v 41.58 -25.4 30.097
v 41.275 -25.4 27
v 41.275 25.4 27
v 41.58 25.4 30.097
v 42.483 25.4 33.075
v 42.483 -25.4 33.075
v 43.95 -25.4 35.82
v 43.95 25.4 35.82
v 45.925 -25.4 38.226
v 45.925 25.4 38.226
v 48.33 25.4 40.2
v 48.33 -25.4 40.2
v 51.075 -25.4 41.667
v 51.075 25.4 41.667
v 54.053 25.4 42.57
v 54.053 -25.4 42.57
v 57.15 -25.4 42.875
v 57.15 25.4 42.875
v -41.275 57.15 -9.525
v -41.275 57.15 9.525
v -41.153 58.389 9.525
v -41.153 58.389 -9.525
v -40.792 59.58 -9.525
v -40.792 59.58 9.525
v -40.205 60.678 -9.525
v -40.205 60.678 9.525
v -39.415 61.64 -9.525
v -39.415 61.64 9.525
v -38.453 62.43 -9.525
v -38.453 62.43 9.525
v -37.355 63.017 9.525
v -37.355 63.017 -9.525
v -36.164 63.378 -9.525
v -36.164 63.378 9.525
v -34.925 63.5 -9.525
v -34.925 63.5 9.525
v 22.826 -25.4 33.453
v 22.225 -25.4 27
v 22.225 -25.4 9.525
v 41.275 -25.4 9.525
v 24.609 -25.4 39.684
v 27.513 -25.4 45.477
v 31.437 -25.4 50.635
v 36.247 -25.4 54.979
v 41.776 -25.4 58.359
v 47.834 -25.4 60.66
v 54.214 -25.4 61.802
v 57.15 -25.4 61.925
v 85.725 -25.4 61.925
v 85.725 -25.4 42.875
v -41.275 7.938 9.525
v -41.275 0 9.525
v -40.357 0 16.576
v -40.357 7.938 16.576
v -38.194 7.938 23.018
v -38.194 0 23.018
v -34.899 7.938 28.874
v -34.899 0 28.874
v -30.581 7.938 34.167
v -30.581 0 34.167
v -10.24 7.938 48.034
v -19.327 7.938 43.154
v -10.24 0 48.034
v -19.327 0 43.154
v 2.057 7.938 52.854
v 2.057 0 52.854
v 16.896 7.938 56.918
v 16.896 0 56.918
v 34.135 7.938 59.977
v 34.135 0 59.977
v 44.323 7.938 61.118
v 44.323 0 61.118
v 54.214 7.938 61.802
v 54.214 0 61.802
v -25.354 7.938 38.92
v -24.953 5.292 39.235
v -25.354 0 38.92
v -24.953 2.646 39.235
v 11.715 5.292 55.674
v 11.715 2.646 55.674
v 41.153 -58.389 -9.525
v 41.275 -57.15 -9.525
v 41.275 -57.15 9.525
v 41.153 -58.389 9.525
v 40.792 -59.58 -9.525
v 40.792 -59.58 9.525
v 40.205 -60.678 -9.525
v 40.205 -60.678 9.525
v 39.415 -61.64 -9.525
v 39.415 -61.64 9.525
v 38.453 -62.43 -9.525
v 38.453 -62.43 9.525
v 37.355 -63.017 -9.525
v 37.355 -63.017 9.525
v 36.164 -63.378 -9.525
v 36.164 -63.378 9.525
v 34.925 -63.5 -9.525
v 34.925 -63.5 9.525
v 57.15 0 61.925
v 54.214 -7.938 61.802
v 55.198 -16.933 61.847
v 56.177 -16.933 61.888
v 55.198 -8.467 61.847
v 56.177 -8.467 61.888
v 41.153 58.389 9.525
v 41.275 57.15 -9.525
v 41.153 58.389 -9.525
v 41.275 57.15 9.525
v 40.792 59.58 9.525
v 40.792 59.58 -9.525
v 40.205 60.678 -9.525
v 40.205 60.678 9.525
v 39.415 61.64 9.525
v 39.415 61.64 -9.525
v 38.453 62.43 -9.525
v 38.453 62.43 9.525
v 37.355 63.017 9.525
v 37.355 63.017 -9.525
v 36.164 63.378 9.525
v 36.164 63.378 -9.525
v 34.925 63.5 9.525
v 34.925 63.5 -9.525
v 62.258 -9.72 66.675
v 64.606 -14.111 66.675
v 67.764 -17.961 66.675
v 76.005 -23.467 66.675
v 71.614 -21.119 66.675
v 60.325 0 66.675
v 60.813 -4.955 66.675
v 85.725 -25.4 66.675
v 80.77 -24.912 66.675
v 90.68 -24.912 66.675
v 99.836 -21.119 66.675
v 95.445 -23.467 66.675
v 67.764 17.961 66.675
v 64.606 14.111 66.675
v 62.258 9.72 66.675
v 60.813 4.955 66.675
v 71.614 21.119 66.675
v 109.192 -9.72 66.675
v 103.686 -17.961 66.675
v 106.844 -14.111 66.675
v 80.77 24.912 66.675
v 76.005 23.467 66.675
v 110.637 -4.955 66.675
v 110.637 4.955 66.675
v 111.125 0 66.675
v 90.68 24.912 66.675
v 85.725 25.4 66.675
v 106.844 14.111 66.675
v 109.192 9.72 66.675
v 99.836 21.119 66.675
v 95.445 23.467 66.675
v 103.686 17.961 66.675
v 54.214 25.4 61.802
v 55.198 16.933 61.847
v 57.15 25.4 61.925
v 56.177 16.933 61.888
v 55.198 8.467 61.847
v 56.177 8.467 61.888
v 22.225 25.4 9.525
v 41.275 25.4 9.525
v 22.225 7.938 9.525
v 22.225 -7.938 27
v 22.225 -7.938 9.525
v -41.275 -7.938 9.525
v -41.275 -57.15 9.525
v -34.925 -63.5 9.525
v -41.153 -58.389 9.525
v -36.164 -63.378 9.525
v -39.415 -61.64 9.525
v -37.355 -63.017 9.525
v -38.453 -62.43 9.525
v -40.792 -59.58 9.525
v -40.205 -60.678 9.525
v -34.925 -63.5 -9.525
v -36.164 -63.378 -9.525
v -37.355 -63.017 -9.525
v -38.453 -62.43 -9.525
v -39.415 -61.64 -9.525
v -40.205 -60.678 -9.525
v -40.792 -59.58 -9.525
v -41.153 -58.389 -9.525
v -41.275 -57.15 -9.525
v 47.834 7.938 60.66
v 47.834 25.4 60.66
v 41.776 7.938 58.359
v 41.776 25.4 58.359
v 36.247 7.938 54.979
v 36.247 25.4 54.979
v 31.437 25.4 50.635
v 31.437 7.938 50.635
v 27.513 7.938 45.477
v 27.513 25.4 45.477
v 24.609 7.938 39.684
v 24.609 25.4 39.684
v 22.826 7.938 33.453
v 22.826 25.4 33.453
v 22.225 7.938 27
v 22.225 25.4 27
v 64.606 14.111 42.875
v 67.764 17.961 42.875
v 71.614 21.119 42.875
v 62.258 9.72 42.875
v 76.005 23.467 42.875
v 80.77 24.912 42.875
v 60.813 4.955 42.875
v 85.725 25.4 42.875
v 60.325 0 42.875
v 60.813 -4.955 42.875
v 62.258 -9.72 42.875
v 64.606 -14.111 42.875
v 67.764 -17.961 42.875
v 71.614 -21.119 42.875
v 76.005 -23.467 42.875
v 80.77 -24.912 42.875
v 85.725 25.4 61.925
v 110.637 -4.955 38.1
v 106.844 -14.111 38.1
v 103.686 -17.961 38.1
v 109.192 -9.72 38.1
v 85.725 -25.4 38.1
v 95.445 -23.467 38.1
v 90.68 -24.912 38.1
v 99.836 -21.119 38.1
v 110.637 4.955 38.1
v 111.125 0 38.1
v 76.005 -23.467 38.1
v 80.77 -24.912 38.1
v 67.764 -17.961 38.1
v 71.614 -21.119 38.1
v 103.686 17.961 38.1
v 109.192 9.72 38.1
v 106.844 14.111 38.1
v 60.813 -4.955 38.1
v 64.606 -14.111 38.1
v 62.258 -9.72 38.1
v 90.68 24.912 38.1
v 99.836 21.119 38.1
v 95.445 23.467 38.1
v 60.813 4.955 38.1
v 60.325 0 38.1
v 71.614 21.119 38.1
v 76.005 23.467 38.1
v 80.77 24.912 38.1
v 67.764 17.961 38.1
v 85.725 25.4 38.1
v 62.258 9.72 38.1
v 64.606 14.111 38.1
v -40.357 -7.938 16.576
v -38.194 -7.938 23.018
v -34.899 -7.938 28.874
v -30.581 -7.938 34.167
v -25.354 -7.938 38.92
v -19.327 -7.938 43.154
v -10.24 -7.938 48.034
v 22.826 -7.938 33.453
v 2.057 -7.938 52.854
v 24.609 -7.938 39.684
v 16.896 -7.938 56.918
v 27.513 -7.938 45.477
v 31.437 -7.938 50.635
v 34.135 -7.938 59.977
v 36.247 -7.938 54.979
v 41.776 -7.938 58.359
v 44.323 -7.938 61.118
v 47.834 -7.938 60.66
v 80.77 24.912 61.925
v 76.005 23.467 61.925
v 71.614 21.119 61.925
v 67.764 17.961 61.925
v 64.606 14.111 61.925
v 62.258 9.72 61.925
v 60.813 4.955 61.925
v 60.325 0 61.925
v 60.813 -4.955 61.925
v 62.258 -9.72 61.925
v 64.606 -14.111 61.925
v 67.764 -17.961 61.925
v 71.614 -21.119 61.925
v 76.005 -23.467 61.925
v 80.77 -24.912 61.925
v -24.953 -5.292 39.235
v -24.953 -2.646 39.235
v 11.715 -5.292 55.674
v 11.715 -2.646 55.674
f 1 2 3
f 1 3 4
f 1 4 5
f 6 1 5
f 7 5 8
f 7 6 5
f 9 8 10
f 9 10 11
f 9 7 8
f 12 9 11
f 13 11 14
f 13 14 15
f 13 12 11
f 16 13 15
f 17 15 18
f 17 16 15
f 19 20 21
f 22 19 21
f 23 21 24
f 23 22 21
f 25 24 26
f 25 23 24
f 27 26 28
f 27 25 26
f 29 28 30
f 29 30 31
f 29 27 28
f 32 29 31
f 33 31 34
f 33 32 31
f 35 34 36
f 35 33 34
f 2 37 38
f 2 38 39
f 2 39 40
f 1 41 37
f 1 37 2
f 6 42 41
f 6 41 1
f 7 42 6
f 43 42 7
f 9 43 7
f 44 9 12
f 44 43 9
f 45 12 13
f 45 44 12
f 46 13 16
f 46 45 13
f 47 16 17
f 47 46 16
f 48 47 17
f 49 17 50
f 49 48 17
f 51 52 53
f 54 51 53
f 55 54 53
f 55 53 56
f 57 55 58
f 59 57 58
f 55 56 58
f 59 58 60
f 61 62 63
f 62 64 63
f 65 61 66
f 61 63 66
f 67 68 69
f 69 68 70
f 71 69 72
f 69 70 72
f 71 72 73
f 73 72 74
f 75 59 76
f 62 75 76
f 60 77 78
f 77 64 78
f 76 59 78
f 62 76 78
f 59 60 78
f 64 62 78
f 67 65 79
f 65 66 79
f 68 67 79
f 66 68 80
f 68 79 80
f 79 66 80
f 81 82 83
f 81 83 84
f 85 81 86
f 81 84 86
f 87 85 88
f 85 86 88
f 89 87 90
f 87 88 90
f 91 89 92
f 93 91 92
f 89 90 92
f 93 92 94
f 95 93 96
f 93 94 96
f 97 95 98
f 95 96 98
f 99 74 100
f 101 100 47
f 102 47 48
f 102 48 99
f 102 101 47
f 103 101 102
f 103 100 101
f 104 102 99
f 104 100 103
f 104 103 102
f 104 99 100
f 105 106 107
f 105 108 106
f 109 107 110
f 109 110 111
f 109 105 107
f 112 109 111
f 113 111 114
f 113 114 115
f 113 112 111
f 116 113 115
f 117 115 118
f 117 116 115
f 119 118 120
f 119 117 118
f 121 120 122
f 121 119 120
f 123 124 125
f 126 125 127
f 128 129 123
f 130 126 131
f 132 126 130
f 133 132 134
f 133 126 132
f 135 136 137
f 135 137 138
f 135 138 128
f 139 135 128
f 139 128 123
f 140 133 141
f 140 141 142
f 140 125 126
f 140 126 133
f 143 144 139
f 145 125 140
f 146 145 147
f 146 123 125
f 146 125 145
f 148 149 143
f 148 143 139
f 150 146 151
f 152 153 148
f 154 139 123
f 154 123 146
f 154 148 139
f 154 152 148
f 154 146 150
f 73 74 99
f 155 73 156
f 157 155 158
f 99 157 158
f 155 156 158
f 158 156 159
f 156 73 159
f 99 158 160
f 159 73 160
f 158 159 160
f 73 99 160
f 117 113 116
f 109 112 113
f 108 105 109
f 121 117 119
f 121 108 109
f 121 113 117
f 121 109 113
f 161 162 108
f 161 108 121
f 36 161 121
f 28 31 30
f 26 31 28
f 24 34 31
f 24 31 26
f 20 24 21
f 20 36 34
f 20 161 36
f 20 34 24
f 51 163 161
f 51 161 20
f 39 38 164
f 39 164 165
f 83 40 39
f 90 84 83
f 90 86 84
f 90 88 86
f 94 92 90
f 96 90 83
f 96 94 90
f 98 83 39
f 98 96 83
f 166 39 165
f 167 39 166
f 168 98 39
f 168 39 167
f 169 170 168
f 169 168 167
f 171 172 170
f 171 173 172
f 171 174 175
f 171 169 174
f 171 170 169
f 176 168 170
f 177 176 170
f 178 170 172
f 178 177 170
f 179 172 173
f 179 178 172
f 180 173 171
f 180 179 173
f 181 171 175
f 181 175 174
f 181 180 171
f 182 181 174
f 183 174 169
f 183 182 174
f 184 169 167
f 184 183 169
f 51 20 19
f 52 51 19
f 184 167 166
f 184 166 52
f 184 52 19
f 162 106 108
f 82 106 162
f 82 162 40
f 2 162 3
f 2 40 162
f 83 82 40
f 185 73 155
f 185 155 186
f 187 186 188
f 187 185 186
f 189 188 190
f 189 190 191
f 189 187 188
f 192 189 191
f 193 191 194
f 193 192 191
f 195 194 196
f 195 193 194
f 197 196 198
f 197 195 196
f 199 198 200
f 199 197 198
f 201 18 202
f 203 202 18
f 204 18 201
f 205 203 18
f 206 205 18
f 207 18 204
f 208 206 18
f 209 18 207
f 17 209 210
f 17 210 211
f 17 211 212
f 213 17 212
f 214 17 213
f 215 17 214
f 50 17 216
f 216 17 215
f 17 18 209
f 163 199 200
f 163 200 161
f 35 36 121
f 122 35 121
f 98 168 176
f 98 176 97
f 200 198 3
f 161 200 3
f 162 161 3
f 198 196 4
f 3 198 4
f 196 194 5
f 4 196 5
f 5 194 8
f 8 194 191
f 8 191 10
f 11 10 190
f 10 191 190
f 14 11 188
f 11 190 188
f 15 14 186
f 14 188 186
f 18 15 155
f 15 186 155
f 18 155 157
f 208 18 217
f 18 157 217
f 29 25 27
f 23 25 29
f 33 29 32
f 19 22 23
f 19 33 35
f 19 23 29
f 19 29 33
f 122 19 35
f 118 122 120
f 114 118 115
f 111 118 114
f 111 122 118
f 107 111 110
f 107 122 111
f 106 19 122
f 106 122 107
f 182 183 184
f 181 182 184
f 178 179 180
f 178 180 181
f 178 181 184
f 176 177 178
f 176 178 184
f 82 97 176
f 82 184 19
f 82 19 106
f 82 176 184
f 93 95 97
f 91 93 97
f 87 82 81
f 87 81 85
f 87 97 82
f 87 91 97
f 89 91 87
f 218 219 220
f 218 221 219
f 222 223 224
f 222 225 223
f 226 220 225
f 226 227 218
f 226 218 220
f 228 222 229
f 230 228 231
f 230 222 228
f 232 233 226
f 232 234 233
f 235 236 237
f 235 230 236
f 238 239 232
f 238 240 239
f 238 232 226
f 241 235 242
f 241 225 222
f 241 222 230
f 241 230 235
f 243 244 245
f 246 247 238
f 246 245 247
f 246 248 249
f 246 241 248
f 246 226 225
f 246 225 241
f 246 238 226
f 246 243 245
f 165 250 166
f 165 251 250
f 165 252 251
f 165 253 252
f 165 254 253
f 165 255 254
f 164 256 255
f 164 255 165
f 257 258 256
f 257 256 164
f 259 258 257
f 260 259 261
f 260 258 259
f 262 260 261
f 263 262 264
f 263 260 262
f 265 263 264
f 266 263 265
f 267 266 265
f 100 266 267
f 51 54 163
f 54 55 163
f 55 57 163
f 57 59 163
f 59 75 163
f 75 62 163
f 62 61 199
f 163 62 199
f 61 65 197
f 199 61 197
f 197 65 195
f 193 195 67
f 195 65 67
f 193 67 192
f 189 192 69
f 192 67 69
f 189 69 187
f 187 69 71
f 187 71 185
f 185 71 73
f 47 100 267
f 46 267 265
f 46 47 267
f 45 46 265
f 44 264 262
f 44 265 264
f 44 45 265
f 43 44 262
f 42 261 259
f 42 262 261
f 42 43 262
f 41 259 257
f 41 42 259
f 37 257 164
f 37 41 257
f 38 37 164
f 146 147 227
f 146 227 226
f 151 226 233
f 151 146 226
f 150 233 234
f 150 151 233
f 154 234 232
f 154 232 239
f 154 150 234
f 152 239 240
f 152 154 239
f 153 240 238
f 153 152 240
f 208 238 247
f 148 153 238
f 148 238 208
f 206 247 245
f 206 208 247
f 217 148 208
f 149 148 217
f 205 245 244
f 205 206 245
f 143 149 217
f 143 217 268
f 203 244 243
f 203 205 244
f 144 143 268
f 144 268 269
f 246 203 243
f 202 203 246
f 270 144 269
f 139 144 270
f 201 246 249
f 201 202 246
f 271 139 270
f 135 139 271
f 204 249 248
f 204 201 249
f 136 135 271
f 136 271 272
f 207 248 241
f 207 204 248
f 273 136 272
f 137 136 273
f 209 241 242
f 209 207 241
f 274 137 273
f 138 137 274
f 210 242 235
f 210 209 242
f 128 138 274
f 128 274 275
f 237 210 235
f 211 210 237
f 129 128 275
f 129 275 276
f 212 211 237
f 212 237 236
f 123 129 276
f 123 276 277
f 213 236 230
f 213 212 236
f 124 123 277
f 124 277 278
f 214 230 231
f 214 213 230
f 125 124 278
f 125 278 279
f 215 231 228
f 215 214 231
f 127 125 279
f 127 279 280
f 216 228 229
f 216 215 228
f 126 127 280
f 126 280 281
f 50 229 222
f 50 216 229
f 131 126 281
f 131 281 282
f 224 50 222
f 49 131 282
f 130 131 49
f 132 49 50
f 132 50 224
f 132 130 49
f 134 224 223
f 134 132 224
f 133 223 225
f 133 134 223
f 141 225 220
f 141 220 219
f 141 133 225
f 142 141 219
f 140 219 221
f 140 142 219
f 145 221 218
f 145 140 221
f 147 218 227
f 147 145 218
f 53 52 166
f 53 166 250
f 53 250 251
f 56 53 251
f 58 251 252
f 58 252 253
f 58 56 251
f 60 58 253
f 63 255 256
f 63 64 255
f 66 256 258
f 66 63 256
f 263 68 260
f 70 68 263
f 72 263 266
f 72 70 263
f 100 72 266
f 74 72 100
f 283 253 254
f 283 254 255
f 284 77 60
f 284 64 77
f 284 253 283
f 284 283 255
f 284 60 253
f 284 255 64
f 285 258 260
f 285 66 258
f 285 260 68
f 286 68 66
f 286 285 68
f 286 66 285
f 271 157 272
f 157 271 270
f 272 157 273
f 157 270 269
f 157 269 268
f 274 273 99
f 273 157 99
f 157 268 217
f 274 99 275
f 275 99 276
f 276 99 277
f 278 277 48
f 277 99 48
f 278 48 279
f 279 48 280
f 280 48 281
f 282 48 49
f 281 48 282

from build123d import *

# Parameters (mm, degrees)
F1_DEPTH = 63.5
F2_DEPTH = 25.4
F3_DEPTH = 7.9375
F0_W     = 25.4
F0_H     = 19.0500000358
F4_DEPTH = 25.4
F6_R     = 6.35


with BuildPart() as f1:
    # F0 (on Front) → F1 (new body, symmetric)
    with BuildSketch(Plane.XZ):
        Polygon((41.275, -9.525), (41.275, 9.525), (22.2249999642, 9.525), (-41.275, 9.525), (-41.275, -9.525), align=None)
    extrude(amount=F1_DEPTH, both=True)

    # F0 (on Front) → F2 (join, symmetric)
    with BuildSketch(Plane.XZ):
        with BuildLine():
            Line((22.2249999642, 9.525), (41.275, 9.525))
            Line((41.275, 9.525), (41.275, 27.0002))
            ThreePointArc((41.275, 27.0002), (45.9246798487, 38.2255201513), (57.15, 42.8752))
            Line((57.15, 42.8752), (60.325, 42.8752))
            Line((60.325, 42.8752), (60.325, 61.9252000358))
            Line((60.325, 61.9252000358), (57.15, 61.9252000358))
            add(Edge.make_bspline(
                [(54.2137588314, 61.801552205), (55.2005191802, 61.8492221851), (56.1795792911, 61.8903742324), (57.15, 61.9252000358)],
                knots=[108.8573598522, 108.8573598522, 108.8573598522, 108.8573598522, 111.5045361803, 111.5045361803, 111.5045361803, 111.5045361803], degree=3))
            ThreePointArc((54.2137588314, 61.801552205), (31.4371253025, 50.6349985456), (22.2249999642, 27.0002))
            Line((22.2249999642, 27.0002), (22.2249999642, 9.525))
        make_face()
    extrude(amount=F2_DEPTH, both=True)

    # F0 (on Front) → F3 (join, symmetric)
    with BuildSketch(Plane.XZ):
        with BuildLine():
            Line((-41.275, 9.525), (22.2249999642, 9.525))
            Line((22.2249999642, 9.525), (22.2249999642, 27.0002))
            ThreePointArc((22.2249999642, 27.0002), (31.4371253025, 50.6349985456), (54.2137588314, 61.801552205))
            add(Edge.make_bspline(
                [(-41.275, 9.525), (-39.9627792732, 46.8589932408), (13.6361345752, 59.8412641353), (54.2137588314, 61.801552205)],
                knots=[0, 0, 0, 0, 108.8573598522, 108.8573598522, 108.8573598522, 108.8573598522], degree=3))
        make_face()
    extrude(amount=F3_DEPTH, both=True)

    # F0 (on Front) → F4 (join, symmetric)
    with BuildSketch(Plane.XZ):
        with Locations((73.025, 52.4002000179)):
            Rectangle(F0_W, F0_H)
    extrude(amount=F4_DEPTH, both=True)

    # F0 (on Front) → F5 (revolve)
    with BuildSketch(Plane.XZ):
        Polygon((85.725, 61.9252000358), (85.725, 42.8752), (85.725, 38.1), (111.125, 38.1), (111.125, 66.675), (85.725, 66.675), align=None)
    revolve(axis=Axis((85.725, 0, 52.3875), (0, 0, 1)))

    # F6
    f6_edges = [f1.edges().sort_by_distance(p)[0] for p in [
        (41.275, -63.5, 0),
        (-41.275, -63.5, 0),
        (-41.275, 63.5, 0),
        (41.275, 63.5, 0),
    ]]
    fillet(f6_edges, radius=F6_R)


solid = f1.part
